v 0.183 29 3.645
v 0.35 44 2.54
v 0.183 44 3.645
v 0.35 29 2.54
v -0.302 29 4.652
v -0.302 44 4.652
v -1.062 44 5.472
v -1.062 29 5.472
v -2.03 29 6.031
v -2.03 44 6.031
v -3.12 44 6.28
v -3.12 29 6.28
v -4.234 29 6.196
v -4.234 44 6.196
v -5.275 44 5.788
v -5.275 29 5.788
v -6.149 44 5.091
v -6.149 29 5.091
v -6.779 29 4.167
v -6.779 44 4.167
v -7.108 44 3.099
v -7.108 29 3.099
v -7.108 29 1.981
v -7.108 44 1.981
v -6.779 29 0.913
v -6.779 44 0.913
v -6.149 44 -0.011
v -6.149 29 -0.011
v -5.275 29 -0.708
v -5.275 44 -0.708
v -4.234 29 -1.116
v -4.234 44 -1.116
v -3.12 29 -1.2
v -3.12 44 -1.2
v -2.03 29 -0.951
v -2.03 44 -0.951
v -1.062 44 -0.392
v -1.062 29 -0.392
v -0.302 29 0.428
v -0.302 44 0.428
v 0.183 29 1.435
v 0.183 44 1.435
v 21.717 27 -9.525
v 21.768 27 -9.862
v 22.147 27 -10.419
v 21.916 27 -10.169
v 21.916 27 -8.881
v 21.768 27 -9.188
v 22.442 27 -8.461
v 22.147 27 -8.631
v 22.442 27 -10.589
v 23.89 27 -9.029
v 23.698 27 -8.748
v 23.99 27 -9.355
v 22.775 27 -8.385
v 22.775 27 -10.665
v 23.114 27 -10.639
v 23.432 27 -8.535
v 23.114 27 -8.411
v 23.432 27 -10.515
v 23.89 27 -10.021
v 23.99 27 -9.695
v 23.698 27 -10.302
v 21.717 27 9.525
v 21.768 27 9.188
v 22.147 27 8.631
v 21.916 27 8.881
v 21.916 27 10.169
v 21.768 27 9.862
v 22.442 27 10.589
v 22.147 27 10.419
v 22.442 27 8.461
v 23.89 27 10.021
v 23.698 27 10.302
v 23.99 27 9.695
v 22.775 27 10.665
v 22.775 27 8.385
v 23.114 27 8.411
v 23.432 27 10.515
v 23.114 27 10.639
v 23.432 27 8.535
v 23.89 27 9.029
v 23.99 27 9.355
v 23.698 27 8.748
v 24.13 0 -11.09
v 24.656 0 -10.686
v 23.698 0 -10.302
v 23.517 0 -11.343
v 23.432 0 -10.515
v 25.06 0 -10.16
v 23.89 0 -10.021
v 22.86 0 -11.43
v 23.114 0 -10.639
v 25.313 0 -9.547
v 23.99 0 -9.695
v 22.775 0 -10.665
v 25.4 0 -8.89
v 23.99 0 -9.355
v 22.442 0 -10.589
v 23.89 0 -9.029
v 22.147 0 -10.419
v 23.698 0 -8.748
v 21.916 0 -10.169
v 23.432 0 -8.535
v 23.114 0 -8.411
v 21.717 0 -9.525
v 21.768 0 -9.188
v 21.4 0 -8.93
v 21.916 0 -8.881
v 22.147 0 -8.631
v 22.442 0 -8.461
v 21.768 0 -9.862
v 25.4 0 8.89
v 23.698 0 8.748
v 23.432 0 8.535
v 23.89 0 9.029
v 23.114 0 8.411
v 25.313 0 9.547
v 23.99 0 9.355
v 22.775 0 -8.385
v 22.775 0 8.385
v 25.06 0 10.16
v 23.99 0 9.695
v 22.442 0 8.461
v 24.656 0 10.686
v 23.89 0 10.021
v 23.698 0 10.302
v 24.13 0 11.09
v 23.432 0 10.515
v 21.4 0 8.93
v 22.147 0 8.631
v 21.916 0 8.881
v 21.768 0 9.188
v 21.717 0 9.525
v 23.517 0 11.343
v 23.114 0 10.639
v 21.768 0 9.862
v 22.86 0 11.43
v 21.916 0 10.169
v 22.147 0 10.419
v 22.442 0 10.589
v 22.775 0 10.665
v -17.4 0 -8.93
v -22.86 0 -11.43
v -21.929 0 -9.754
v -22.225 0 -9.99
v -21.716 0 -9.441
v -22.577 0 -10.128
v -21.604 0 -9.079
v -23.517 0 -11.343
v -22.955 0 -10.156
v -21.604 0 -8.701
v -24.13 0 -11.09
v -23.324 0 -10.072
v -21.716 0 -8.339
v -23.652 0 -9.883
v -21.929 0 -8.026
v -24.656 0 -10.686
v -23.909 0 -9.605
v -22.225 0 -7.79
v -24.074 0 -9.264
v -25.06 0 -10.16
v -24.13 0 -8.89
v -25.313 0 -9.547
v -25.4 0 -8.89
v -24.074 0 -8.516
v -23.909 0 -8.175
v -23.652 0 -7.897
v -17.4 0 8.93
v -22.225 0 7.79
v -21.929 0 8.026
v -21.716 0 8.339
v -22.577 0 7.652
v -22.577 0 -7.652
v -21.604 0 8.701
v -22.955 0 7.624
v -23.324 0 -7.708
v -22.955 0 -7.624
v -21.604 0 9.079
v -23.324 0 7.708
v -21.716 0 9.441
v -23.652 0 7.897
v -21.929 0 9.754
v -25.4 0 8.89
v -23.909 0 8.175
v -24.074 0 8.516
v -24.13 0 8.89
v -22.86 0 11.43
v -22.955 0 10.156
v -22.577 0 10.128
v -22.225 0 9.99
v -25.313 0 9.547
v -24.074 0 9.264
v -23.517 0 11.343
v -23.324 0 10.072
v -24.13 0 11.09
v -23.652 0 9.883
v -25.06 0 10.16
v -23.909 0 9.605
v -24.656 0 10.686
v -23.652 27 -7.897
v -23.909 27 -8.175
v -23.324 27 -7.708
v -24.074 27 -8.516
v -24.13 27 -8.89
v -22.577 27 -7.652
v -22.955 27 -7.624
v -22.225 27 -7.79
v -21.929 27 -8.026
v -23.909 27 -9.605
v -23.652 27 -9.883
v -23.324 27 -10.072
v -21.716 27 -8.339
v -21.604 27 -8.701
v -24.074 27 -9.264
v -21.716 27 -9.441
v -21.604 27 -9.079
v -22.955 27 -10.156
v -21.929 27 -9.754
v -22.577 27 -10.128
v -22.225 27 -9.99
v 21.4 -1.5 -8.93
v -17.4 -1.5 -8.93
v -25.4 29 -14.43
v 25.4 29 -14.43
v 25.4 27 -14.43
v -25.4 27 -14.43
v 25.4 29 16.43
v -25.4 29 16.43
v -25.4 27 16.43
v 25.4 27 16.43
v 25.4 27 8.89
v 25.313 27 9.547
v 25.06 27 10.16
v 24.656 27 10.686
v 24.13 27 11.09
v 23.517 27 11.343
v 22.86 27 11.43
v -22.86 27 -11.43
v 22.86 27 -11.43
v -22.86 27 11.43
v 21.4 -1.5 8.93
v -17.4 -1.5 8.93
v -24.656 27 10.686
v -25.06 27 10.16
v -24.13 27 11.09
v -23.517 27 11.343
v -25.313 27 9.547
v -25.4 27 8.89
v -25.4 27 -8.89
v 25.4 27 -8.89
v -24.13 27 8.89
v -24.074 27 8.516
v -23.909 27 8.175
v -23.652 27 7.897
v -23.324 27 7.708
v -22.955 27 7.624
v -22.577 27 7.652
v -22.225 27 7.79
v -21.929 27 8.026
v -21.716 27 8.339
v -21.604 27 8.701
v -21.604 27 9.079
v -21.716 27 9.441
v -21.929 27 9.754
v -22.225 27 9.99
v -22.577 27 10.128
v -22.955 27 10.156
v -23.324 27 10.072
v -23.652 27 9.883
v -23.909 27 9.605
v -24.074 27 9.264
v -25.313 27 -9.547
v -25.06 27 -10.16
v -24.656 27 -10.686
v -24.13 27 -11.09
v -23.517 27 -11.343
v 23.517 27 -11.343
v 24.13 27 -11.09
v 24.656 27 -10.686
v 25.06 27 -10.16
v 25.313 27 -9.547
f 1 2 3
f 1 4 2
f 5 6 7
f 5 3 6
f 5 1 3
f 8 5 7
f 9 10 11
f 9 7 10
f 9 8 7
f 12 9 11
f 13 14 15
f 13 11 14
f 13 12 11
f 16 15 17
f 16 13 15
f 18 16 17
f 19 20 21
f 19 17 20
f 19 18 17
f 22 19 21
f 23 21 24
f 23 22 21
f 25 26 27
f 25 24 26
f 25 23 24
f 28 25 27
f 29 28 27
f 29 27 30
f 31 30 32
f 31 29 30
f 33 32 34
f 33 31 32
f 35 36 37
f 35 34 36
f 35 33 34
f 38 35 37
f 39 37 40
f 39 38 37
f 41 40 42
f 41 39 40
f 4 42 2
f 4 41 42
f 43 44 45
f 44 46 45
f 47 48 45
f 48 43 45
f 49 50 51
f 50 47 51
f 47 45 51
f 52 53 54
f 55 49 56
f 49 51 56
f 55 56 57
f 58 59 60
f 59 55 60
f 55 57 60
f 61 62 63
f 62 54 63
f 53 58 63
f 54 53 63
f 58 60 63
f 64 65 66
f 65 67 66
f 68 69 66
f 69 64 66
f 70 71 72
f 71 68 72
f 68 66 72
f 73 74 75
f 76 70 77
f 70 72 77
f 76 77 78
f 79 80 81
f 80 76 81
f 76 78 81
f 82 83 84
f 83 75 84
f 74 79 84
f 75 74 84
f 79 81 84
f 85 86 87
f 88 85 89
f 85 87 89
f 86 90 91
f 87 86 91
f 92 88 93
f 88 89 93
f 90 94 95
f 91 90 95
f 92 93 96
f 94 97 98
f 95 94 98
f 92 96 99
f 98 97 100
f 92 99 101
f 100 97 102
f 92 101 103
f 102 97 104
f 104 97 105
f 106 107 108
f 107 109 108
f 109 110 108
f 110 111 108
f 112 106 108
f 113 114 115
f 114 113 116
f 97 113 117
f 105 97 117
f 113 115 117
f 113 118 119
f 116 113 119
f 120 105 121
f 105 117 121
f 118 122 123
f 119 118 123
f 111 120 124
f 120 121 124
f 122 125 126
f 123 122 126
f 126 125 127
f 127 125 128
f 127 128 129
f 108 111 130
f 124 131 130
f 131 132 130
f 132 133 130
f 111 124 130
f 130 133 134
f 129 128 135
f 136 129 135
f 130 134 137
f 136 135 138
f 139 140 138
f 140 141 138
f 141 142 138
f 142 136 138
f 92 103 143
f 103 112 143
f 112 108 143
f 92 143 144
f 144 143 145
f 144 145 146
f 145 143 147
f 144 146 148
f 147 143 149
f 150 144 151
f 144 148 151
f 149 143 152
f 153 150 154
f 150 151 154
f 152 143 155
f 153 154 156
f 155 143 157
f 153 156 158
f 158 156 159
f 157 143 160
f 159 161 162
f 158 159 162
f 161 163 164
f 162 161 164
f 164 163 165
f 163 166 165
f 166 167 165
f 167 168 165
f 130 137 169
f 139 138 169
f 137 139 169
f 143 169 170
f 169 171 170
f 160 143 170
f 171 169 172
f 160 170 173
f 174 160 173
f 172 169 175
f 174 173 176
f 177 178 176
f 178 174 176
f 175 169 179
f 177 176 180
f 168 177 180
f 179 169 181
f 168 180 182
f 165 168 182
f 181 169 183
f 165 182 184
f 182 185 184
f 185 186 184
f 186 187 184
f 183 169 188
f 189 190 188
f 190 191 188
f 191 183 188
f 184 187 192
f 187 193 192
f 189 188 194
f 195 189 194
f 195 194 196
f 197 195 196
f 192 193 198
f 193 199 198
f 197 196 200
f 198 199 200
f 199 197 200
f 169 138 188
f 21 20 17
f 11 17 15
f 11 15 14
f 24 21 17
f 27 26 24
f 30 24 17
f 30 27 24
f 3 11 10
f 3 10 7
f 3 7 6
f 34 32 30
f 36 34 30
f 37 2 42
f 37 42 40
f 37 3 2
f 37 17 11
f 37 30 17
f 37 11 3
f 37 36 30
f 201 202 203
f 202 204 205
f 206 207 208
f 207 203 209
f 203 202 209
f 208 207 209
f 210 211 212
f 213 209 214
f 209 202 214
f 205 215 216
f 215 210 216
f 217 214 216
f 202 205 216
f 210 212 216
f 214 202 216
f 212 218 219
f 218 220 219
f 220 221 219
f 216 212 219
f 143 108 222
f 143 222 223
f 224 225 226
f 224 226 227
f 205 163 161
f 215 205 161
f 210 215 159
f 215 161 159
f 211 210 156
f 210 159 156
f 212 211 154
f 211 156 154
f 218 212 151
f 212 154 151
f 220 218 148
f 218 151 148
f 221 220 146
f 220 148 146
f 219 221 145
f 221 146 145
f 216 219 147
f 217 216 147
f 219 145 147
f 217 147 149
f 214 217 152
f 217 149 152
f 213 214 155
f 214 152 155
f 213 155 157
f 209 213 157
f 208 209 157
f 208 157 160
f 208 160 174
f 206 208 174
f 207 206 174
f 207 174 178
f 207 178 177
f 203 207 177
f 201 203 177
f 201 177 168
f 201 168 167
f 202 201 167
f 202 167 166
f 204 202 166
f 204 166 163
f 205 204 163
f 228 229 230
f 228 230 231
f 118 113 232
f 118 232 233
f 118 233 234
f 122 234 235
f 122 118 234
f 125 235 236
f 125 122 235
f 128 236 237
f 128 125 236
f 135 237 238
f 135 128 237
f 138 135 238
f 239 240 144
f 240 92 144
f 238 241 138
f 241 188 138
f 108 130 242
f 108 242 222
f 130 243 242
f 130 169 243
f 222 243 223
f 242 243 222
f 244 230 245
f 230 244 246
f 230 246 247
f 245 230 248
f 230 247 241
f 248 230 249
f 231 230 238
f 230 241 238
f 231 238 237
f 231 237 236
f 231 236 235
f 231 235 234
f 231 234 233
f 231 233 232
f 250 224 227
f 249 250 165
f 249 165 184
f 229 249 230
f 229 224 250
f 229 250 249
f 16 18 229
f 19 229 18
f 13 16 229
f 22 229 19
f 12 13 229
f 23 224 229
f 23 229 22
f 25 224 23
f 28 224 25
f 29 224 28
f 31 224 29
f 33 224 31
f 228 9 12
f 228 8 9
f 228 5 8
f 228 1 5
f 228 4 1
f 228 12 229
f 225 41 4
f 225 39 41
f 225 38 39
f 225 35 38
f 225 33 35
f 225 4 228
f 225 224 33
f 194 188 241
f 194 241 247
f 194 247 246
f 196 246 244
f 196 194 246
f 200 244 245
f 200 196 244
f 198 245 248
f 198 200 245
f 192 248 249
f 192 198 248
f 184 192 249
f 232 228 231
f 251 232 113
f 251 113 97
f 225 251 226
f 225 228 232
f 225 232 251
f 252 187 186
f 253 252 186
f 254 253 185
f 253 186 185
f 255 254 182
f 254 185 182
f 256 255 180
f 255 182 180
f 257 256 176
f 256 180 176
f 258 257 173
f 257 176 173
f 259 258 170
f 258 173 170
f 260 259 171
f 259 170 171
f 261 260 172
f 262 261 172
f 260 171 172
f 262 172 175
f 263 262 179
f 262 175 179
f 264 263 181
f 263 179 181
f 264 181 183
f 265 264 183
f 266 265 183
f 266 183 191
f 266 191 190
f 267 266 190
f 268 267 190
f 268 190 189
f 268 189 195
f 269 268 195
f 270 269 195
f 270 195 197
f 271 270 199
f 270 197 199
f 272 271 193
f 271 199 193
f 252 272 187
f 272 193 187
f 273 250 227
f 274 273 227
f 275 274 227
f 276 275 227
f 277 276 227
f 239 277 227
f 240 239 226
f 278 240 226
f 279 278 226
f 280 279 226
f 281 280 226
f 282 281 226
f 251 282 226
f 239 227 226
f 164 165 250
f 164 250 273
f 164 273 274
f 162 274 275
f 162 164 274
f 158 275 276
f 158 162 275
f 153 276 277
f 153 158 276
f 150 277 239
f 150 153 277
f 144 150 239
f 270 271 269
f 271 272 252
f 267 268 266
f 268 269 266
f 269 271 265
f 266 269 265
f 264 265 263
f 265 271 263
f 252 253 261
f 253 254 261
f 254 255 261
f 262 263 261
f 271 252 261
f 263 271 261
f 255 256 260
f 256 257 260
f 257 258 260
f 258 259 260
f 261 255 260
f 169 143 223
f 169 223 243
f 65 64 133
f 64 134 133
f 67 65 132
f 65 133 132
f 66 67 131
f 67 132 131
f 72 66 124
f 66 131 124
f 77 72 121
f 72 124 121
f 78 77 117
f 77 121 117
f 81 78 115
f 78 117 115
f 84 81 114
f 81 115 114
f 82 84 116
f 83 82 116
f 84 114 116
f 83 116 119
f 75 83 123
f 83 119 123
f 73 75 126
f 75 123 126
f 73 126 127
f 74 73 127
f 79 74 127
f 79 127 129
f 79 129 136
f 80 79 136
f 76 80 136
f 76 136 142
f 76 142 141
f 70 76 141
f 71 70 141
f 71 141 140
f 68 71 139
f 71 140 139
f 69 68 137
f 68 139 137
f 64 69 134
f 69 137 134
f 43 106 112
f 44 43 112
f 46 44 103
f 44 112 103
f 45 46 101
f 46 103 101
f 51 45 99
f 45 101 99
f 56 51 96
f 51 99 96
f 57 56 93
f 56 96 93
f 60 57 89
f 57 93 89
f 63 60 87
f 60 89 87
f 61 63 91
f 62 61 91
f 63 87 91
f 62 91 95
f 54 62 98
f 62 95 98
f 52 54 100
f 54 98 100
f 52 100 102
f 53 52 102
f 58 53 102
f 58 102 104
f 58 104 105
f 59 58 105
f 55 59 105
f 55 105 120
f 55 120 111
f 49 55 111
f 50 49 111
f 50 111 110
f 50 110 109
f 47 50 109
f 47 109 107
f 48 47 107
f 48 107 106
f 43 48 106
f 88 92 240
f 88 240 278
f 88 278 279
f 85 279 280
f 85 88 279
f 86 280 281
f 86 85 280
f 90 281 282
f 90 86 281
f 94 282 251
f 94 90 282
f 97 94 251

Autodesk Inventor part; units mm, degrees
ref_plane "YZ Plane" through (0, 0, 0) normal (1, 0, 0) x (0, 1, 0)
ref_plane "XZ Plane" through (0, 0, 0) normal (0, 1, 0) x (-1, 0, 0)
ref_plane "XY Plane" through (0, 0, 0) normal (0, 0, 1) x (1, 0, 0)
sketch "Sketch1" plane through (0, 0, 0) normal (0, 1, 0) x (-1, 0, 0)
  line L0 (22.86, 11.43) -> (-22.86, 11.43)
  line L1 (-25.4, 8.89) -> (-25.4, -8.89)
  line L2 (-22.86, -11.43) -> (22.86, -11.43)
  line L3 (25.4, -8.89) -> (25.4, 8.89)
  line L4 (25.4, 11.43) -> (-25.4, -11.43) construction
  line L5 (-25.4, 11.43) -> (25.4, -11.43) construction
  circle A0 centre (22.86, 8.89) radius 1.27
  circle A1 centre (22.86, -8.89) radius 1.27
  circle A2 centre (-22.86, 9.525) radius 1.143
  circle A3 centre (-22.86, -9.525) radius 1.143
  arc A4 (25.4, 8.89) -> (22.86, 11.43) centre (22.86, 8.89) ccw
  arc A5 (22.86, -11.43) -> (25.4, -8.89) centre (22.86, -8.89) ccw
  arc A6 (-22.86, 11.43) -> (-25.4, 8.89) centre (-22.86, 8.89) ccw
  arc A7 (-25.4, -8.89) -> (-22.86, -11.43) centre (-22.86, -8.89) ccw
  point P0 (0, 0)
  dimension "d0" = 50.8
  dimension "d1" = 22.86
  dimension "d2" = 2.54
  dimension "d3" = 2.54
  dimension "d4" = 2.286
  dimension "d5" = 2.286
  dimension "d6" = 17.78
  dimension "d7" = 19.05
  dimension "d9" = 8.89
  dimension "d10" = 2.54
  dimension "d11" = 2.54
  dimension "d12" = 9.525
  dimension "d13" = 2.54
  dimension "d14" = 2.54
  dimension "d15" = 2.54
extrude "Extrusion1" add sketch "Sketch1" along normal blind 29
sketch "Sketch8" plane through (0, 29, 0) normal (0, 1, 0) x (1, 0, 0)
  circle A0 centre (-3.4, -2.54) radius 3.75
  line L0 (-25.4, 8.89) -> (-25.4, -8.89) projected
  point P0 (0, 0)
  dimension "d62" = 7.5
  dimension "d63" = 2.54
  dimension "d64" = 22
extrude "Extrusion8" add sketch "Sketch8" along normal blind 15
sketch "Sketch9" plane through (0, 0, 0) normal (0, -1, 0) x (1, 0, 0)
  line L0 (-17.4, 8.93) -> (21.4, 8.93)
  line L1 (21.4, 8.93) -> (21.4, -8.93)
  line L2 (21.4, -8.93) -> (-17.4, -8.93)
  line L3 (-17.4, -8.93) -> (-17.4, 8.93)
  line L4 (-25.4, -8.89) -> (-25.4, 8.89) projected
  line L5 (25.4, 8.89) -> (25.4, -8.89) projected
  line L6 (-22.86, 11.43) -> (22.86, 11.43) projected
  line L7 (22.86, -11.43) -> (-22.86, -11.43) projected
  point P0 (0, 0)
  dimension "d67" = 8
  dimension "d68" = 4
  dimension "d69" = 2.5
  dimension "d70" = 2.5
extrude "Extrusion9" add sketch "Sketch9" along normal blind 1.5
sketch "Sketch10" plane through (0, 29, 0) normal (0, 1, 0) x (1, 0, 0)
  line L0 (25.4, 14.43) -> (-25.4, 14.43)
  line L1 (-25.4, 14.43) -> (-25.4, -16.43)
  line L2 (-25.4, -16.43) -> (25.4, -16.43)
  line L3 (25.4, -16.43) -> (25.4, 14.43)
  line L4 (25.4, -8.89) -> (25.4, 8.89) projected
  line L5 (-25.4, 8.89) -> (-25.4, -8.89) projected
  line L6 (-22.86, -11.43) -> (22.86, -11.43) projected
  line L7 (22.86, 11.43) -> (-22.86, 11.43) projected
  point P0 (0, 0)
  point P1 (25.4, 0)
  point P2 (-25.4, -1)
  dimension "d73" = 5
  dimension "d74" = 3
extrude "Extrusion10" add sketch "Sketch10" against normal blind 2
ref_plane "Work Plane1" through (2, 0, -8.93) normal (-1, 0, 0) x (0, 0, 1)
properties part number "ESP8266 Feather"
